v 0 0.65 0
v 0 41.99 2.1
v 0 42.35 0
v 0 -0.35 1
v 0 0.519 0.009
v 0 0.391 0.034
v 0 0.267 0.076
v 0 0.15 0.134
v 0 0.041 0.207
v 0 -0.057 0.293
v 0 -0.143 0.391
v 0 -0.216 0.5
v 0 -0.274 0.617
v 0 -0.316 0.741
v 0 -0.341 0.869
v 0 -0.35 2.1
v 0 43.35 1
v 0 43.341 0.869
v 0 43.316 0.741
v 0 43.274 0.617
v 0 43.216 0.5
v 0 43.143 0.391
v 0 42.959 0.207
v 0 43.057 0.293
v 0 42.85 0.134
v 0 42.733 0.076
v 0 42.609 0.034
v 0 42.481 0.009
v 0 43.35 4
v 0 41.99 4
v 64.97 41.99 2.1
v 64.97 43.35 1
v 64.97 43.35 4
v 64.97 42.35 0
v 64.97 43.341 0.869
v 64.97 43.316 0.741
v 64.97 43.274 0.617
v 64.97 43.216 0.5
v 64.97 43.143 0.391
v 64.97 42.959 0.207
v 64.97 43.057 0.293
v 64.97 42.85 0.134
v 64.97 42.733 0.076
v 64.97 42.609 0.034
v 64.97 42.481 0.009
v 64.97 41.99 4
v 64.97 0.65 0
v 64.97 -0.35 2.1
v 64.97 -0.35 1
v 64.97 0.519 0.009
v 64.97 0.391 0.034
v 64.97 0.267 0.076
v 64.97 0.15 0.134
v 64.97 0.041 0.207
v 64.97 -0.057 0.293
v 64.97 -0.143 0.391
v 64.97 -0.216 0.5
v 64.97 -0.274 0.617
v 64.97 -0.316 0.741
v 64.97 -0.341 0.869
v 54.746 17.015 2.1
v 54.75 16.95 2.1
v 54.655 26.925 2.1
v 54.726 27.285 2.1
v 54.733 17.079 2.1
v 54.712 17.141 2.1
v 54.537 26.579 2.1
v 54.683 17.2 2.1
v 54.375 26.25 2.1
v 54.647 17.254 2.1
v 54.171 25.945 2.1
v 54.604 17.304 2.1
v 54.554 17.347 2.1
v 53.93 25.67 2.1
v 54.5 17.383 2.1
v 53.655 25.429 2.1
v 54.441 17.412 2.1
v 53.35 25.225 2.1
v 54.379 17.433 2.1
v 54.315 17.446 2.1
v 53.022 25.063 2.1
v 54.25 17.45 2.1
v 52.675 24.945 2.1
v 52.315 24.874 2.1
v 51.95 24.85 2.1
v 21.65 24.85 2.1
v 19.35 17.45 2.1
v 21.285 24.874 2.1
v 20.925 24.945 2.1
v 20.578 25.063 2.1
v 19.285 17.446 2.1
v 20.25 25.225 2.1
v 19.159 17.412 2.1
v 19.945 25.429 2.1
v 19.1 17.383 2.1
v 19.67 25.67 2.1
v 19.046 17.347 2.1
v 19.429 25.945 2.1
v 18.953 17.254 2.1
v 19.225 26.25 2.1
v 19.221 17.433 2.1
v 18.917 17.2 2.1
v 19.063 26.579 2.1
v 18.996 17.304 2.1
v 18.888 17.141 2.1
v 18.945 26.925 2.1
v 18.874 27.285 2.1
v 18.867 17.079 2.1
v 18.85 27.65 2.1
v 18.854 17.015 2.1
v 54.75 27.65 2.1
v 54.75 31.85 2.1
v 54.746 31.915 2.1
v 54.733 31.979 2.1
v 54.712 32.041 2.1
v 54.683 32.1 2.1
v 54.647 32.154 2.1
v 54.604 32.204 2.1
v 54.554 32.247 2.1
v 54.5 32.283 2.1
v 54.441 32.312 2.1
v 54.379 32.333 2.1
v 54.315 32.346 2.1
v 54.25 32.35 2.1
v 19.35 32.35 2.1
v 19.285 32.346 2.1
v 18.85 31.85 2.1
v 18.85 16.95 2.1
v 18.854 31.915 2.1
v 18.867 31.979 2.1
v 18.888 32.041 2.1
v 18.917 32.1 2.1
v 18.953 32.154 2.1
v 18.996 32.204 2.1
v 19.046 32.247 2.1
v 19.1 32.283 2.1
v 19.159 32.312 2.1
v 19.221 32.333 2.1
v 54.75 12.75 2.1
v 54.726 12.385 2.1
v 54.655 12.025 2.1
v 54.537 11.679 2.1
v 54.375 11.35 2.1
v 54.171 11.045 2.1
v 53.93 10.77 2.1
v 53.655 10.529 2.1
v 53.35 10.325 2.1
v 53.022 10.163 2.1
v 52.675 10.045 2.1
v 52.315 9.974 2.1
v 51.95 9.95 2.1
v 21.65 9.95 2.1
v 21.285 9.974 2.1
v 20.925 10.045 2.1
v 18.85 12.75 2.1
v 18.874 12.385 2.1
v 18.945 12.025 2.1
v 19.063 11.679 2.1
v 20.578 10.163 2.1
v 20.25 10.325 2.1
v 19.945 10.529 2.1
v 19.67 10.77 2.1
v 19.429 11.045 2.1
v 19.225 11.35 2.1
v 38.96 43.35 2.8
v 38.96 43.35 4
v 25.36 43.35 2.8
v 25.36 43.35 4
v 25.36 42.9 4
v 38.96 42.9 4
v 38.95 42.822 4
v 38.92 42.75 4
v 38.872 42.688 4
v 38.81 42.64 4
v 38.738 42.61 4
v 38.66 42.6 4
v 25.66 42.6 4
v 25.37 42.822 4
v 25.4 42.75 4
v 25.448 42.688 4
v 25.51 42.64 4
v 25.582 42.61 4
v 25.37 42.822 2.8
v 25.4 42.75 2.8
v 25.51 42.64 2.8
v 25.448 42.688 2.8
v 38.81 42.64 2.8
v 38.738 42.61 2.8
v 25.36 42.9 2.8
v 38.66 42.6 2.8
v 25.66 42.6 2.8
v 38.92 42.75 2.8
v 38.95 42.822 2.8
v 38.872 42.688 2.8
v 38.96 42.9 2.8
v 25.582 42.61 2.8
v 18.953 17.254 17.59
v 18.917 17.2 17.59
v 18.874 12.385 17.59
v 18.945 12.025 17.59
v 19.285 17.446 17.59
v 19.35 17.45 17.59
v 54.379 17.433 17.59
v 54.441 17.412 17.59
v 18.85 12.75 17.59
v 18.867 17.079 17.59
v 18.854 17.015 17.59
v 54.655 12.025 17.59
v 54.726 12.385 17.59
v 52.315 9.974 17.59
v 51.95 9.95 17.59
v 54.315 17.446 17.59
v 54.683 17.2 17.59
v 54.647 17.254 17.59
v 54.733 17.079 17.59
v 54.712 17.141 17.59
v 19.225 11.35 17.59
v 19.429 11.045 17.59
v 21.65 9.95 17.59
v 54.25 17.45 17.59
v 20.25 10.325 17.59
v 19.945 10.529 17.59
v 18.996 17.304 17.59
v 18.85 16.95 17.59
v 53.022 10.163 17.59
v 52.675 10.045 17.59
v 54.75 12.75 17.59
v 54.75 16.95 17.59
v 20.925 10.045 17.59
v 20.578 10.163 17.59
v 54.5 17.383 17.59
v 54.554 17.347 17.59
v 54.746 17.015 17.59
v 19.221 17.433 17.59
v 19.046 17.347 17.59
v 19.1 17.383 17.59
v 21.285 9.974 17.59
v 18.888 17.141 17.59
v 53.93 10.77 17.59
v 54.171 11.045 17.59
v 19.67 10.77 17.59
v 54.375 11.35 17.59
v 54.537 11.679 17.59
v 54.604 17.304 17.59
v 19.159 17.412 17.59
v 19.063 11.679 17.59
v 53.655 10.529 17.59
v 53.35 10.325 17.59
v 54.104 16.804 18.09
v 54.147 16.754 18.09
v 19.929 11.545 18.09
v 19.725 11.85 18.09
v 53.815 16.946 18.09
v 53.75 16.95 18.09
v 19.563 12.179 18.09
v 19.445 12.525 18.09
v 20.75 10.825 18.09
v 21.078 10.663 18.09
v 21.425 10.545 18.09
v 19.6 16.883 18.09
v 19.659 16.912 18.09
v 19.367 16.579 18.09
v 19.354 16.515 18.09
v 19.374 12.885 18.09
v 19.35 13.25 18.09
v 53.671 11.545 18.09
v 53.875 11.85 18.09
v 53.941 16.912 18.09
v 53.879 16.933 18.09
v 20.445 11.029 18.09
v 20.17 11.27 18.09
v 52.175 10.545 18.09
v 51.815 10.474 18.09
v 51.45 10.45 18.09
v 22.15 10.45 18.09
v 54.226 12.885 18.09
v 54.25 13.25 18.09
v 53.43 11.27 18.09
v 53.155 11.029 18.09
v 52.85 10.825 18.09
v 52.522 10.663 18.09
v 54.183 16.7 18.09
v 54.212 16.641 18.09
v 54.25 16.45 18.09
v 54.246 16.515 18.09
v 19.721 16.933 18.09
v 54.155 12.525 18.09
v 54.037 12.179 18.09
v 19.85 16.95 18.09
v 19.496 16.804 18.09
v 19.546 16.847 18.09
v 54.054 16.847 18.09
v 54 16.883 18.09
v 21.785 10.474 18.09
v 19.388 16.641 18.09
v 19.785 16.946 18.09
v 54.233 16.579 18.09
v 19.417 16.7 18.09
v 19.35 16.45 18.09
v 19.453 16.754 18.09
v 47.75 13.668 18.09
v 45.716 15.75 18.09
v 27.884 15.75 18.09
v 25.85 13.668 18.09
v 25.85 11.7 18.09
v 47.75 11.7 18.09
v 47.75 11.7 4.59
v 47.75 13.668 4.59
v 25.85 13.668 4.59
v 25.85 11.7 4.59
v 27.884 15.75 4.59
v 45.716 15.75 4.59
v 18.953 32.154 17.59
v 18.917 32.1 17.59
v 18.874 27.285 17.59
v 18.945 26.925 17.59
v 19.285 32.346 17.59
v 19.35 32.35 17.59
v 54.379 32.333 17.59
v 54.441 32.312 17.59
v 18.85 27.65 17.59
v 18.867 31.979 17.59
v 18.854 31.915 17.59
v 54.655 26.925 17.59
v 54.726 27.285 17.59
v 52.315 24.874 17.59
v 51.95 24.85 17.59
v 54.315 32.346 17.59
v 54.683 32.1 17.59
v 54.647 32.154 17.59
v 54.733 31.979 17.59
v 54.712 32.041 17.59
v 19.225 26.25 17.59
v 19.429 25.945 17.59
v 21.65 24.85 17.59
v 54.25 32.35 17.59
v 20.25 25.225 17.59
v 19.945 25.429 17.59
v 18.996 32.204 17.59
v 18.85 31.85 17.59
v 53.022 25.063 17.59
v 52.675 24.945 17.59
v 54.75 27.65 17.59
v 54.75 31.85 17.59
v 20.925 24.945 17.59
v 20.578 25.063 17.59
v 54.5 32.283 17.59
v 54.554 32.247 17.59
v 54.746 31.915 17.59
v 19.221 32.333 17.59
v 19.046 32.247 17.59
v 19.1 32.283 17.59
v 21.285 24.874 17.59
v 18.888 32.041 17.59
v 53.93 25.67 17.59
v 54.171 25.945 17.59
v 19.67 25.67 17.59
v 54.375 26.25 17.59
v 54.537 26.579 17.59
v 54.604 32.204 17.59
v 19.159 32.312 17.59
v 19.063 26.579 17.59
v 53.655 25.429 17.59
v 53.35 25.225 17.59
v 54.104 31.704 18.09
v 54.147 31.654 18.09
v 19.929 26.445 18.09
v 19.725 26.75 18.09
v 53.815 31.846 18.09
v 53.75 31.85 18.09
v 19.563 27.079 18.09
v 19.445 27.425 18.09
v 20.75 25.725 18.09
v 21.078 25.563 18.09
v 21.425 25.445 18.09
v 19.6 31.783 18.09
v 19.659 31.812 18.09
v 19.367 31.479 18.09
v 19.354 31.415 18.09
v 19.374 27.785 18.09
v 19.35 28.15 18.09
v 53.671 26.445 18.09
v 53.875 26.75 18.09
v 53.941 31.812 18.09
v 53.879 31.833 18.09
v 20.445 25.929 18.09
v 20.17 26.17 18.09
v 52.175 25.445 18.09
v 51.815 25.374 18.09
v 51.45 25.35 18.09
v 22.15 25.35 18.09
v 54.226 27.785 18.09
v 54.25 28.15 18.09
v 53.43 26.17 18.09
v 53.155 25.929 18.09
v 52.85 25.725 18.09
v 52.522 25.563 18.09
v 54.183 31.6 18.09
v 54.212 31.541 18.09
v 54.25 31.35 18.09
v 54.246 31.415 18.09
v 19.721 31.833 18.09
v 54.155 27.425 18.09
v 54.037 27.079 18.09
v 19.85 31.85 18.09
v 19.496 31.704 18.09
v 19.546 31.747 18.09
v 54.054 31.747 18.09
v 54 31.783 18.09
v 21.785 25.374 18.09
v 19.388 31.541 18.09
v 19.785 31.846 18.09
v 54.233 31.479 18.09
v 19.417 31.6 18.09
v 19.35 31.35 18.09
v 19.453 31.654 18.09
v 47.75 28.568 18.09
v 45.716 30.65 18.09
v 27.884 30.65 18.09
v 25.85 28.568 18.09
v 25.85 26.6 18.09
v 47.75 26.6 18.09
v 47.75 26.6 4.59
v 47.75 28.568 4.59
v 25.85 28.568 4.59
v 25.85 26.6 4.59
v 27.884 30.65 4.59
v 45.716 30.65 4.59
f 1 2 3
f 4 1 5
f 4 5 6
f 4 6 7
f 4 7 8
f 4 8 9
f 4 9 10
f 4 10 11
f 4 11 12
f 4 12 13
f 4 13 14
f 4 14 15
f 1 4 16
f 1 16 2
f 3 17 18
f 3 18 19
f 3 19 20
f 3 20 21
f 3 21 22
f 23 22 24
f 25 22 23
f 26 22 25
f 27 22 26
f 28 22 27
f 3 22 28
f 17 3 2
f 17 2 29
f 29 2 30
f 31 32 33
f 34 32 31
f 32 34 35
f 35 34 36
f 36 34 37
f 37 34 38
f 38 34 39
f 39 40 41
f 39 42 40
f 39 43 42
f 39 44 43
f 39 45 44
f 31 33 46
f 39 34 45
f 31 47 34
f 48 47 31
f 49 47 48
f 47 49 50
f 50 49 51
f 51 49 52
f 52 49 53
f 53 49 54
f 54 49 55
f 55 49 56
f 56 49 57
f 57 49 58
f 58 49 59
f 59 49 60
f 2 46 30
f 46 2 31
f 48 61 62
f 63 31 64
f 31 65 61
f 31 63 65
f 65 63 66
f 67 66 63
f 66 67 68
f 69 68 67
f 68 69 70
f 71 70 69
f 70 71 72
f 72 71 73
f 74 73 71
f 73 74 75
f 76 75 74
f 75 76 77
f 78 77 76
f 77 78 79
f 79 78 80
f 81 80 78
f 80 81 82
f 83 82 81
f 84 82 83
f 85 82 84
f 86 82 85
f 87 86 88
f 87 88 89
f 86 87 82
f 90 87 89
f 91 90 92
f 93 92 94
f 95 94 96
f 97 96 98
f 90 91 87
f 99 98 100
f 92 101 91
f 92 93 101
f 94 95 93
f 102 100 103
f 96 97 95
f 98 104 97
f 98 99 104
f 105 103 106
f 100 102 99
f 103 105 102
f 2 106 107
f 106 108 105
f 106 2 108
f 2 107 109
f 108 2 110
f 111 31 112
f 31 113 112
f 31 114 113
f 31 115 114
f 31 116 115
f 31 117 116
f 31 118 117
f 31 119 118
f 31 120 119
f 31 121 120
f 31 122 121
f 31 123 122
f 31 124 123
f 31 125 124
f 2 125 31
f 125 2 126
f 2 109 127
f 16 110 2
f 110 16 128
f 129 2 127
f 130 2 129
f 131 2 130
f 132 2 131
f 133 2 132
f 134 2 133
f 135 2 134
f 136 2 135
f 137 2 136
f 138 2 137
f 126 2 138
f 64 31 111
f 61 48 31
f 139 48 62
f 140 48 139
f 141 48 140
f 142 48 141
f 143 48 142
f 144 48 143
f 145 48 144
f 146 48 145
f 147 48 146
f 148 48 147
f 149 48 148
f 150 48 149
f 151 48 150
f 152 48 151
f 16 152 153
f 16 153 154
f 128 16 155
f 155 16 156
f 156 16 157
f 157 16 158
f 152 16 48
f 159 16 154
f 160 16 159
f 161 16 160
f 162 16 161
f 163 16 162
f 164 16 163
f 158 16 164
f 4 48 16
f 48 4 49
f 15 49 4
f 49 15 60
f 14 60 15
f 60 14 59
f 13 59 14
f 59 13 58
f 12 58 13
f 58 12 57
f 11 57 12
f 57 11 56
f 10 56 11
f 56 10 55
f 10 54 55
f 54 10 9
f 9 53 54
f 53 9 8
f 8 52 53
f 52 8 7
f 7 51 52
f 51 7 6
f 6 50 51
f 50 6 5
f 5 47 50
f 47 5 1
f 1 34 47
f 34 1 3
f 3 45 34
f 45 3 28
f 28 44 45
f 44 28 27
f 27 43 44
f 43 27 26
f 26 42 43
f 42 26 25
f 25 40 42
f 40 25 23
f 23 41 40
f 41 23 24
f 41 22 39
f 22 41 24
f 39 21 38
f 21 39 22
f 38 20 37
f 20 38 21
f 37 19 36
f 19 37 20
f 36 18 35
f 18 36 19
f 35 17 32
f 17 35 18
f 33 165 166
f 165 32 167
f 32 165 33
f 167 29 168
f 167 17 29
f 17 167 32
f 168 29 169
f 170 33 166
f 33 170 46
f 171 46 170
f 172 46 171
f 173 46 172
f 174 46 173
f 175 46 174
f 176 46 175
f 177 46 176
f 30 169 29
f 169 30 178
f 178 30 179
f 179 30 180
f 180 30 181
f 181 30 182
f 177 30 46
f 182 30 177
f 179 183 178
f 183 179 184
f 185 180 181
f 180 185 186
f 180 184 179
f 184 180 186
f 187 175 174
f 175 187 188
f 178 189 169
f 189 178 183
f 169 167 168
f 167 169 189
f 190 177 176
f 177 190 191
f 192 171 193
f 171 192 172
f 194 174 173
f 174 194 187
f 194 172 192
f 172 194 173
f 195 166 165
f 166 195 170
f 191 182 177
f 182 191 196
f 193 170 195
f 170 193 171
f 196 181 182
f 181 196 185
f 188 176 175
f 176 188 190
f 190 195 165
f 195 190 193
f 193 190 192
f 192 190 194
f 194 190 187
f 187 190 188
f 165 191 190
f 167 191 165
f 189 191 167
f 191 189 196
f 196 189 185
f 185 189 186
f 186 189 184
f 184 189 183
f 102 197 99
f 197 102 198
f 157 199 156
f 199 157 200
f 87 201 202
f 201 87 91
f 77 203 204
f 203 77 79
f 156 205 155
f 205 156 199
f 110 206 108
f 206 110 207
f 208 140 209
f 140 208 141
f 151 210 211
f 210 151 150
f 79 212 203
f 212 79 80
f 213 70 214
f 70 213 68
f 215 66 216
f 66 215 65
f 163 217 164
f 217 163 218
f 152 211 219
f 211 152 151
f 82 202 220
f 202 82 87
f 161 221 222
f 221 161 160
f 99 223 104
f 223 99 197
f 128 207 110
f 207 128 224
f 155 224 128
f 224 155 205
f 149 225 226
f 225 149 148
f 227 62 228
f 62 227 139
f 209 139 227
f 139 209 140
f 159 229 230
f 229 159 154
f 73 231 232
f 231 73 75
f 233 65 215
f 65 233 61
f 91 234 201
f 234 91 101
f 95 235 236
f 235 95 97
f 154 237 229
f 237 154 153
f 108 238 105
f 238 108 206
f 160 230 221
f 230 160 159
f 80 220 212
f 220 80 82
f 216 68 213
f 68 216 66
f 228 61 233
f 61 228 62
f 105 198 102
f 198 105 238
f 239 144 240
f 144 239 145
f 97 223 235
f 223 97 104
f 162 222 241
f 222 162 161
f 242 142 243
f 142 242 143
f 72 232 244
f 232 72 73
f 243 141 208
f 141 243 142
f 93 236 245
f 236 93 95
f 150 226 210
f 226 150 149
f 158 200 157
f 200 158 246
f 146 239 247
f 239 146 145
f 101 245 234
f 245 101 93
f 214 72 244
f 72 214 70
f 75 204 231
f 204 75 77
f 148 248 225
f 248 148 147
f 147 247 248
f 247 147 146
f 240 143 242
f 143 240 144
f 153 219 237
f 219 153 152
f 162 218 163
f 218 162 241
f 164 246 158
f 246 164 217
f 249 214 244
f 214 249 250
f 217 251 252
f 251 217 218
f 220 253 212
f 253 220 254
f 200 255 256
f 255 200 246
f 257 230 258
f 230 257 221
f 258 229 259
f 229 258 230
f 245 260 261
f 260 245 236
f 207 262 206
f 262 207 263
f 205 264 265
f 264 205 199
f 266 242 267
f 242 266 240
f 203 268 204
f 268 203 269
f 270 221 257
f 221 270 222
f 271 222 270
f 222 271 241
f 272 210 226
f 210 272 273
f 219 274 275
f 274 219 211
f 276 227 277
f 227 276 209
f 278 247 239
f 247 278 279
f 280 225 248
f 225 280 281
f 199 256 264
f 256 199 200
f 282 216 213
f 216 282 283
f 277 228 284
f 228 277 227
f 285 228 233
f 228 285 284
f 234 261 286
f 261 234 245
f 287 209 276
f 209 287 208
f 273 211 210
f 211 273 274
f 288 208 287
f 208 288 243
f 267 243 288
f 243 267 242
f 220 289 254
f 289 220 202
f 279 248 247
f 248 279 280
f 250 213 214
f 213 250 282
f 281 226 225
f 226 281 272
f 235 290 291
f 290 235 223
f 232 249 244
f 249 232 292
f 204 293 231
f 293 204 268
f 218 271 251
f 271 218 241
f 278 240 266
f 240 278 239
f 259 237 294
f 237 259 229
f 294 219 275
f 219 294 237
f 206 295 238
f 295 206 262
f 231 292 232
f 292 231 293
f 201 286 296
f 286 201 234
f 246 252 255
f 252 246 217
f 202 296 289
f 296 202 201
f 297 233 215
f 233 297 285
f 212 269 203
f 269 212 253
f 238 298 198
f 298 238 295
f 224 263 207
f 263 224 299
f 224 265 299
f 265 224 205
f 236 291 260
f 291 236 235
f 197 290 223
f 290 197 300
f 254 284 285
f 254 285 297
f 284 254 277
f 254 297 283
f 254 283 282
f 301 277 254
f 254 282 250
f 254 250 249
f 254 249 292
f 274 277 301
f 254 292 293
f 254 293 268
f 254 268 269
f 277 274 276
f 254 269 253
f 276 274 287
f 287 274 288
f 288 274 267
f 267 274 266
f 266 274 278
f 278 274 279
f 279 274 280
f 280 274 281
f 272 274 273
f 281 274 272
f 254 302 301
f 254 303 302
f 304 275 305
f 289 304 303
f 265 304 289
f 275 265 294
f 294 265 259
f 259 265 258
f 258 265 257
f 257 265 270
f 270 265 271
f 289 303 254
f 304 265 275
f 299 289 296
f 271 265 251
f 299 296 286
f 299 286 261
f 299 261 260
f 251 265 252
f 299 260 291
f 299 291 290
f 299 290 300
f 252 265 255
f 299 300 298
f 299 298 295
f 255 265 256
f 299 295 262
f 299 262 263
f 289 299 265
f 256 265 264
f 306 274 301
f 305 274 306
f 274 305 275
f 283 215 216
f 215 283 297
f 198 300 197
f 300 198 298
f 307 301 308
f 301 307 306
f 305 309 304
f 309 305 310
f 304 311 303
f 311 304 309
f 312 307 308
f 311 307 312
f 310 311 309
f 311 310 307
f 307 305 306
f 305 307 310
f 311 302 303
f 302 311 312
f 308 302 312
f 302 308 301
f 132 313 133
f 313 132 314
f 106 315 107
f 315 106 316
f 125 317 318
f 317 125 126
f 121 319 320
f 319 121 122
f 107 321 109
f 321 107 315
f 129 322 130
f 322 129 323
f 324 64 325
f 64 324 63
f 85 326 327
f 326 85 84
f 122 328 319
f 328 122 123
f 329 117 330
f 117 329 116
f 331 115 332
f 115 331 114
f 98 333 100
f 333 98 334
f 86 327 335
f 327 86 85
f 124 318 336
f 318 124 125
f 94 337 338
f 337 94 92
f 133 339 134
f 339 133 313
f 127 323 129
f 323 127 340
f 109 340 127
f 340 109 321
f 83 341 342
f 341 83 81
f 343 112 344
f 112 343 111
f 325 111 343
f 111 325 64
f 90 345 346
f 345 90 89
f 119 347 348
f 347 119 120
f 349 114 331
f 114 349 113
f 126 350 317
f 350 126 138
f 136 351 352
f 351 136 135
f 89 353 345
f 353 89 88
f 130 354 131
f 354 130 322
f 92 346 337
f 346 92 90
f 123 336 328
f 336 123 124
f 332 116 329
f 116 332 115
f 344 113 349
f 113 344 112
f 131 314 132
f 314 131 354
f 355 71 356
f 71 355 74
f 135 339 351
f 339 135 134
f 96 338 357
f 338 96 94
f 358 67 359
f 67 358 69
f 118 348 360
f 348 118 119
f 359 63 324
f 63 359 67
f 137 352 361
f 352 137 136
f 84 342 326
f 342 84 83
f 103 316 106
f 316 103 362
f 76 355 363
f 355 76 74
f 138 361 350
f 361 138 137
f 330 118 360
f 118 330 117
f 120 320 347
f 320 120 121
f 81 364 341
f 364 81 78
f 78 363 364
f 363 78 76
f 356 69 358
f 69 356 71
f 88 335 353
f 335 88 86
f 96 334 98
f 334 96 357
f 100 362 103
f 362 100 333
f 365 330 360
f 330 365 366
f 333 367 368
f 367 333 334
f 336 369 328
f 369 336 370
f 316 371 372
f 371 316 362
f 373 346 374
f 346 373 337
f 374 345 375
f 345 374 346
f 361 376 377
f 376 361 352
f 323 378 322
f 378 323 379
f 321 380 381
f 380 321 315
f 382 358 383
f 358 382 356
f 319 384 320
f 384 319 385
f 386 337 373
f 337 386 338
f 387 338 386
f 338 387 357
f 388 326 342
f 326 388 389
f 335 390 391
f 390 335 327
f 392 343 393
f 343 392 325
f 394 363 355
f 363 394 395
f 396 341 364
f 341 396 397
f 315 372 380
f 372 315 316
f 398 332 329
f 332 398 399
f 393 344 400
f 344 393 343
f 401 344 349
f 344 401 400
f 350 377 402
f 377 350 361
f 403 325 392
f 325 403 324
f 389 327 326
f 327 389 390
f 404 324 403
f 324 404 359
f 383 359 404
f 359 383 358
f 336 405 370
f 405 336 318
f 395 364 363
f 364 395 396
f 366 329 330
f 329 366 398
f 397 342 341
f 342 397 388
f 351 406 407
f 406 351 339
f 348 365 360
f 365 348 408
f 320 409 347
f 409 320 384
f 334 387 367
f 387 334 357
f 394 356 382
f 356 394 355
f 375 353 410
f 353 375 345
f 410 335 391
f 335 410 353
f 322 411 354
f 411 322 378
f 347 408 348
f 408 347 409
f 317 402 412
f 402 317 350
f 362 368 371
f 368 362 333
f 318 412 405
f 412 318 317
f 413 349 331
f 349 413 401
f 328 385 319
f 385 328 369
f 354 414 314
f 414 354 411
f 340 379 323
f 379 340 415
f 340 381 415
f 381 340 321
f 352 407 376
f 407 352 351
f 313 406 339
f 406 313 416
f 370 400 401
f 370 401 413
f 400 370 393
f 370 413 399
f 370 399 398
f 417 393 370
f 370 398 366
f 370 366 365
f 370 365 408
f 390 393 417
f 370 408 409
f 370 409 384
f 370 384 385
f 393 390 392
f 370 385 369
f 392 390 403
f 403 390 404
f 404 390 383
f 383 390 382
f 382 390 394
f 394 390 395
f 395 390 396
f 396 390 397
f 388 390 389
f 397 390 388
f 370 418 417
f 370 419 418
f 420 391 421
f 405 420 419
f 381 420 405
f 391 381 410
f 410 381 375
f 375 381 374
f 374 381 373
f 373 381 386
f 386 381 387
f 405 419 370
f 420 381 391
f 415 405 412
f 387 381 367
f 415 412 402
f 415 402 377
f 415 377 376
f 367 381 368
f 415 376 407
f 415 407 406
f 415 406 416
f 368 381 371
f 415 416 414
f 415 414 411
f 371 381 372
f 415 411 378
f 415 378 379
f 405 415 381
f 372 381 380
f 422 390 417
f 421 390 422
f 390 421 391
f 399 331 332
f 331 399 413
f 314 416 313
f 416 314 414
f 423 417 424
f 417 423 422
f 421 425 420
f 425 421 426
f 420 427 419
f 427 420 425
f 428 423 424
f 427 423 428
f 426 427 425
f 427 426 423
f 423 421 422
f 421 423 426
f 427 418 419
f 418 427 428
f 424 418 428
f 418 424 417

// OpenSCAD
// Wii (RVL-001) friction-fit memory card slot cover

/* [Slots] */
// Distance from the console's outer surface (hinge side) to slot B's near wall
slotB_z0 = 9.55;
// Distance between the two slots' outer walls
slots_span = 23.2;
// Narrow width of a slot opening in the trim
slot_w = 8.3;
// Long side of a slot opening in the trim
slot_len = 36.0;
// Distance from the controller-port-door end to the near end of the slots
slot_x0 = 18.8;

/* [Plug] */
// Card width (along X). Real card ~35.6; less = more slack against x errors
plug_w = 35.9;   // 35.2 loose; 36.1 too tight; 35.7 left ~0.2 play -> 35.9
// Card thickness (along Z).
plug_t = 7.5;    // 7.0 had ~1.0 total play; +0.9 was too tight -> +0.5
// Plug length, measured from the cover's inner face
plug_len = 16;   // 12 only reached ~0.4 past the connector tongue tip (11.3 from bezel)
// Lead-in chamfer at the plug tip
tip_chamfer = 0.5;
// Edge radius on the card's bottom-half side
r_bottom = 2.8;
// Edge radius on the card's lid side
r_lid = 0.5;
// Shrink the connector mouth cross-section by this much on every side
mouth_shrink = 0.2;

/* [Cover outline] */
// Length along the console (64.32 + 0.65 so both end gaps are ~0.35)
cover_len = 64.97;
// Hinge-side edge (0 - 0.35: gap 0.7 like the original door)
cover_z_min = -0.35;
// Far edge (44 - 0.65: flush with the console's flat face)
cover_z_max = 43.35;
// Plate thickness
plate_t = 2.1;
// Radius of the two long outer edges of the visible face
edge_r = 1.0;

/* [Lip] */
// Lip thickness (along Z), flush with the far edge
lip_t = 1.36;   // was 1.56: lip bound over the last ~1 mm of insertion; 1.16 too thin
// Lip height below the plate's inner face
lip_h = 1.9;
// Notch in the lip: start along X, width, depth into the lip from the far edge,
// height from the lip's free end, inner corner radius
notch_x0 = 25.36;
notch_w = 13.6;
notch_depth = 0.75;
notch_h = 1.2;
notch_r = 0.3;

/* [Hidden] */
$fn = 48;
plate_inner_y = -plate_t;
eps = 0.01;

slotB_zc = slotB_z0 + slot_w/2;
slotA_zc = slotB_z0 + slots_span - slot_w/2;
slot_xc = slot_x0 + slot_len/2;

// Card connector mouth: 22.3 wide at the bottom-half side, with 45-degree
// chamfers to 18.0 on the lid side; spans 1.55..6.0 above the bottom face (of 7.0); 13.5 deep.
mouth_depth = 13.5;

// Cross-section of plate + lip in the (Y, Z) plane, extruded along X.
module cover_2d() {
    // plate with rounded outer long edges
    hull() {
        translate([-plate_t, cover_z_min]) {
            square([plate_t - edge_r, cover_z_max - cover_z_min]);
        }
        for (zc = [cover_z_min + edge_r, cover_z_max - edge_r]) {
            translate([-edge_r, zc]) circle(r = edge_r);
        }
    }
    // lip on the far side
    translate([-plate_t - lip_h, cover_z_max - lip_t]) {
        square([lip_h + eps, lip_t]);
    }
}

// Notch cross-section in the (X, Z) plane, rounded inner corners.
module notch_2d() {
    z_in = cover_z_max - notch_depth;
    hull() {
        for (x = [notch_x0 + notch_r, notch_x0 + notch_w - notch_r]) {
            translate([x, z_in + notch_r]) {
                circle(r = notch_r, $fn = 24);
            }
        }
        translate([notch_x0, z_in + notch_r]) {
            square([notch_w, notch_depth]);
        }
    }
}

module cover_base() {
    difference() {
        // (Y, Z) profile extruded along +X
        rotate([90, 0, 90]) {
            linear_extrude(cover_len) {
                cover_2d();
            }
        }
        // notch: (X, Z) profile extruded along -Y from the lip's free end
        translate([0, -plate_t - lip_h - 1, 0]) rotate([-90, 0, 0]) {
            mirror([0, 1, 0]) {
                linear_extrude(notch_h + 1) {
                    notch_2d();
                }
            }
        }
    }
}

// 2D card cross-section in local (u = width, v = thickness) coordinates,
// centred; v<0 is the bottom-half side (big radius), v>0 the lid side.
module card_profile(w, t) {
    hull() {
        for (su = [-1, 1]) {
            translate([su * (w/2 - r_bottom), -t/2 + r_bottom]) {
                circle(r = r_bottom);
            }
            translate([su * (w/2 - r_lid), t/2 - r_lid]) {
                circle(r = r_lid);
            }
        }
    }
}

module mouth_profile(t) {
    // v measured from the bottom face (-t/2)
    v0 = -t/2 + 1.55; v1 = -t/2 + 3.8; v2 = -t/2 + 6.0;
    polygon([[-11.15, v0], [11.15, v0], [11.15, v1], [9.0, v2],
             [-9.0, v2], [-11.15, v1]]);
}

module plug() {
    body_len = plug_len - tip_chamfer;
    difference() {
        union() {
            linear_extrude(body_len) card_profile(plug_w, plug_t);
            // chamfered tip
            hull() {
                translate([0, 0, body_len - eps]) {
                    linear_extrude(eps) {
                        card_profile(plug_w, plug_t);
                    }
                }
                translate([0, 0, plug_len - eps]) {
                    linear_extrude(eps) {
                        card_profile(plug_w - 2*tip_chamfer, plug_t - 2*tip_chamfer);
                    }
                }
            }
        }
        d = min(mouth_depth, plug_len - 2);
        translate([0, 0, plug_len - d]) {
            linear_extrude(d + 1) {
                offset(delta = -mouth_shrink) {
                    mouth_profile(plug_t);
                }
            }
        }
    }
}

module plug_pos(zc) {
    translate([slot_xc, plate_inner_y + eps, zc]) {
        rotate([90, 0, 0]) {
            children();
        }
    }
}

module cover() {
    rotate([-90, 0, 0]) {
        cover_base();
        plug_pos(slotB_zc) {
            plug();
        }
        plug_pos(slotA_zc) {
            plug();
        }
    }
}

cover();
